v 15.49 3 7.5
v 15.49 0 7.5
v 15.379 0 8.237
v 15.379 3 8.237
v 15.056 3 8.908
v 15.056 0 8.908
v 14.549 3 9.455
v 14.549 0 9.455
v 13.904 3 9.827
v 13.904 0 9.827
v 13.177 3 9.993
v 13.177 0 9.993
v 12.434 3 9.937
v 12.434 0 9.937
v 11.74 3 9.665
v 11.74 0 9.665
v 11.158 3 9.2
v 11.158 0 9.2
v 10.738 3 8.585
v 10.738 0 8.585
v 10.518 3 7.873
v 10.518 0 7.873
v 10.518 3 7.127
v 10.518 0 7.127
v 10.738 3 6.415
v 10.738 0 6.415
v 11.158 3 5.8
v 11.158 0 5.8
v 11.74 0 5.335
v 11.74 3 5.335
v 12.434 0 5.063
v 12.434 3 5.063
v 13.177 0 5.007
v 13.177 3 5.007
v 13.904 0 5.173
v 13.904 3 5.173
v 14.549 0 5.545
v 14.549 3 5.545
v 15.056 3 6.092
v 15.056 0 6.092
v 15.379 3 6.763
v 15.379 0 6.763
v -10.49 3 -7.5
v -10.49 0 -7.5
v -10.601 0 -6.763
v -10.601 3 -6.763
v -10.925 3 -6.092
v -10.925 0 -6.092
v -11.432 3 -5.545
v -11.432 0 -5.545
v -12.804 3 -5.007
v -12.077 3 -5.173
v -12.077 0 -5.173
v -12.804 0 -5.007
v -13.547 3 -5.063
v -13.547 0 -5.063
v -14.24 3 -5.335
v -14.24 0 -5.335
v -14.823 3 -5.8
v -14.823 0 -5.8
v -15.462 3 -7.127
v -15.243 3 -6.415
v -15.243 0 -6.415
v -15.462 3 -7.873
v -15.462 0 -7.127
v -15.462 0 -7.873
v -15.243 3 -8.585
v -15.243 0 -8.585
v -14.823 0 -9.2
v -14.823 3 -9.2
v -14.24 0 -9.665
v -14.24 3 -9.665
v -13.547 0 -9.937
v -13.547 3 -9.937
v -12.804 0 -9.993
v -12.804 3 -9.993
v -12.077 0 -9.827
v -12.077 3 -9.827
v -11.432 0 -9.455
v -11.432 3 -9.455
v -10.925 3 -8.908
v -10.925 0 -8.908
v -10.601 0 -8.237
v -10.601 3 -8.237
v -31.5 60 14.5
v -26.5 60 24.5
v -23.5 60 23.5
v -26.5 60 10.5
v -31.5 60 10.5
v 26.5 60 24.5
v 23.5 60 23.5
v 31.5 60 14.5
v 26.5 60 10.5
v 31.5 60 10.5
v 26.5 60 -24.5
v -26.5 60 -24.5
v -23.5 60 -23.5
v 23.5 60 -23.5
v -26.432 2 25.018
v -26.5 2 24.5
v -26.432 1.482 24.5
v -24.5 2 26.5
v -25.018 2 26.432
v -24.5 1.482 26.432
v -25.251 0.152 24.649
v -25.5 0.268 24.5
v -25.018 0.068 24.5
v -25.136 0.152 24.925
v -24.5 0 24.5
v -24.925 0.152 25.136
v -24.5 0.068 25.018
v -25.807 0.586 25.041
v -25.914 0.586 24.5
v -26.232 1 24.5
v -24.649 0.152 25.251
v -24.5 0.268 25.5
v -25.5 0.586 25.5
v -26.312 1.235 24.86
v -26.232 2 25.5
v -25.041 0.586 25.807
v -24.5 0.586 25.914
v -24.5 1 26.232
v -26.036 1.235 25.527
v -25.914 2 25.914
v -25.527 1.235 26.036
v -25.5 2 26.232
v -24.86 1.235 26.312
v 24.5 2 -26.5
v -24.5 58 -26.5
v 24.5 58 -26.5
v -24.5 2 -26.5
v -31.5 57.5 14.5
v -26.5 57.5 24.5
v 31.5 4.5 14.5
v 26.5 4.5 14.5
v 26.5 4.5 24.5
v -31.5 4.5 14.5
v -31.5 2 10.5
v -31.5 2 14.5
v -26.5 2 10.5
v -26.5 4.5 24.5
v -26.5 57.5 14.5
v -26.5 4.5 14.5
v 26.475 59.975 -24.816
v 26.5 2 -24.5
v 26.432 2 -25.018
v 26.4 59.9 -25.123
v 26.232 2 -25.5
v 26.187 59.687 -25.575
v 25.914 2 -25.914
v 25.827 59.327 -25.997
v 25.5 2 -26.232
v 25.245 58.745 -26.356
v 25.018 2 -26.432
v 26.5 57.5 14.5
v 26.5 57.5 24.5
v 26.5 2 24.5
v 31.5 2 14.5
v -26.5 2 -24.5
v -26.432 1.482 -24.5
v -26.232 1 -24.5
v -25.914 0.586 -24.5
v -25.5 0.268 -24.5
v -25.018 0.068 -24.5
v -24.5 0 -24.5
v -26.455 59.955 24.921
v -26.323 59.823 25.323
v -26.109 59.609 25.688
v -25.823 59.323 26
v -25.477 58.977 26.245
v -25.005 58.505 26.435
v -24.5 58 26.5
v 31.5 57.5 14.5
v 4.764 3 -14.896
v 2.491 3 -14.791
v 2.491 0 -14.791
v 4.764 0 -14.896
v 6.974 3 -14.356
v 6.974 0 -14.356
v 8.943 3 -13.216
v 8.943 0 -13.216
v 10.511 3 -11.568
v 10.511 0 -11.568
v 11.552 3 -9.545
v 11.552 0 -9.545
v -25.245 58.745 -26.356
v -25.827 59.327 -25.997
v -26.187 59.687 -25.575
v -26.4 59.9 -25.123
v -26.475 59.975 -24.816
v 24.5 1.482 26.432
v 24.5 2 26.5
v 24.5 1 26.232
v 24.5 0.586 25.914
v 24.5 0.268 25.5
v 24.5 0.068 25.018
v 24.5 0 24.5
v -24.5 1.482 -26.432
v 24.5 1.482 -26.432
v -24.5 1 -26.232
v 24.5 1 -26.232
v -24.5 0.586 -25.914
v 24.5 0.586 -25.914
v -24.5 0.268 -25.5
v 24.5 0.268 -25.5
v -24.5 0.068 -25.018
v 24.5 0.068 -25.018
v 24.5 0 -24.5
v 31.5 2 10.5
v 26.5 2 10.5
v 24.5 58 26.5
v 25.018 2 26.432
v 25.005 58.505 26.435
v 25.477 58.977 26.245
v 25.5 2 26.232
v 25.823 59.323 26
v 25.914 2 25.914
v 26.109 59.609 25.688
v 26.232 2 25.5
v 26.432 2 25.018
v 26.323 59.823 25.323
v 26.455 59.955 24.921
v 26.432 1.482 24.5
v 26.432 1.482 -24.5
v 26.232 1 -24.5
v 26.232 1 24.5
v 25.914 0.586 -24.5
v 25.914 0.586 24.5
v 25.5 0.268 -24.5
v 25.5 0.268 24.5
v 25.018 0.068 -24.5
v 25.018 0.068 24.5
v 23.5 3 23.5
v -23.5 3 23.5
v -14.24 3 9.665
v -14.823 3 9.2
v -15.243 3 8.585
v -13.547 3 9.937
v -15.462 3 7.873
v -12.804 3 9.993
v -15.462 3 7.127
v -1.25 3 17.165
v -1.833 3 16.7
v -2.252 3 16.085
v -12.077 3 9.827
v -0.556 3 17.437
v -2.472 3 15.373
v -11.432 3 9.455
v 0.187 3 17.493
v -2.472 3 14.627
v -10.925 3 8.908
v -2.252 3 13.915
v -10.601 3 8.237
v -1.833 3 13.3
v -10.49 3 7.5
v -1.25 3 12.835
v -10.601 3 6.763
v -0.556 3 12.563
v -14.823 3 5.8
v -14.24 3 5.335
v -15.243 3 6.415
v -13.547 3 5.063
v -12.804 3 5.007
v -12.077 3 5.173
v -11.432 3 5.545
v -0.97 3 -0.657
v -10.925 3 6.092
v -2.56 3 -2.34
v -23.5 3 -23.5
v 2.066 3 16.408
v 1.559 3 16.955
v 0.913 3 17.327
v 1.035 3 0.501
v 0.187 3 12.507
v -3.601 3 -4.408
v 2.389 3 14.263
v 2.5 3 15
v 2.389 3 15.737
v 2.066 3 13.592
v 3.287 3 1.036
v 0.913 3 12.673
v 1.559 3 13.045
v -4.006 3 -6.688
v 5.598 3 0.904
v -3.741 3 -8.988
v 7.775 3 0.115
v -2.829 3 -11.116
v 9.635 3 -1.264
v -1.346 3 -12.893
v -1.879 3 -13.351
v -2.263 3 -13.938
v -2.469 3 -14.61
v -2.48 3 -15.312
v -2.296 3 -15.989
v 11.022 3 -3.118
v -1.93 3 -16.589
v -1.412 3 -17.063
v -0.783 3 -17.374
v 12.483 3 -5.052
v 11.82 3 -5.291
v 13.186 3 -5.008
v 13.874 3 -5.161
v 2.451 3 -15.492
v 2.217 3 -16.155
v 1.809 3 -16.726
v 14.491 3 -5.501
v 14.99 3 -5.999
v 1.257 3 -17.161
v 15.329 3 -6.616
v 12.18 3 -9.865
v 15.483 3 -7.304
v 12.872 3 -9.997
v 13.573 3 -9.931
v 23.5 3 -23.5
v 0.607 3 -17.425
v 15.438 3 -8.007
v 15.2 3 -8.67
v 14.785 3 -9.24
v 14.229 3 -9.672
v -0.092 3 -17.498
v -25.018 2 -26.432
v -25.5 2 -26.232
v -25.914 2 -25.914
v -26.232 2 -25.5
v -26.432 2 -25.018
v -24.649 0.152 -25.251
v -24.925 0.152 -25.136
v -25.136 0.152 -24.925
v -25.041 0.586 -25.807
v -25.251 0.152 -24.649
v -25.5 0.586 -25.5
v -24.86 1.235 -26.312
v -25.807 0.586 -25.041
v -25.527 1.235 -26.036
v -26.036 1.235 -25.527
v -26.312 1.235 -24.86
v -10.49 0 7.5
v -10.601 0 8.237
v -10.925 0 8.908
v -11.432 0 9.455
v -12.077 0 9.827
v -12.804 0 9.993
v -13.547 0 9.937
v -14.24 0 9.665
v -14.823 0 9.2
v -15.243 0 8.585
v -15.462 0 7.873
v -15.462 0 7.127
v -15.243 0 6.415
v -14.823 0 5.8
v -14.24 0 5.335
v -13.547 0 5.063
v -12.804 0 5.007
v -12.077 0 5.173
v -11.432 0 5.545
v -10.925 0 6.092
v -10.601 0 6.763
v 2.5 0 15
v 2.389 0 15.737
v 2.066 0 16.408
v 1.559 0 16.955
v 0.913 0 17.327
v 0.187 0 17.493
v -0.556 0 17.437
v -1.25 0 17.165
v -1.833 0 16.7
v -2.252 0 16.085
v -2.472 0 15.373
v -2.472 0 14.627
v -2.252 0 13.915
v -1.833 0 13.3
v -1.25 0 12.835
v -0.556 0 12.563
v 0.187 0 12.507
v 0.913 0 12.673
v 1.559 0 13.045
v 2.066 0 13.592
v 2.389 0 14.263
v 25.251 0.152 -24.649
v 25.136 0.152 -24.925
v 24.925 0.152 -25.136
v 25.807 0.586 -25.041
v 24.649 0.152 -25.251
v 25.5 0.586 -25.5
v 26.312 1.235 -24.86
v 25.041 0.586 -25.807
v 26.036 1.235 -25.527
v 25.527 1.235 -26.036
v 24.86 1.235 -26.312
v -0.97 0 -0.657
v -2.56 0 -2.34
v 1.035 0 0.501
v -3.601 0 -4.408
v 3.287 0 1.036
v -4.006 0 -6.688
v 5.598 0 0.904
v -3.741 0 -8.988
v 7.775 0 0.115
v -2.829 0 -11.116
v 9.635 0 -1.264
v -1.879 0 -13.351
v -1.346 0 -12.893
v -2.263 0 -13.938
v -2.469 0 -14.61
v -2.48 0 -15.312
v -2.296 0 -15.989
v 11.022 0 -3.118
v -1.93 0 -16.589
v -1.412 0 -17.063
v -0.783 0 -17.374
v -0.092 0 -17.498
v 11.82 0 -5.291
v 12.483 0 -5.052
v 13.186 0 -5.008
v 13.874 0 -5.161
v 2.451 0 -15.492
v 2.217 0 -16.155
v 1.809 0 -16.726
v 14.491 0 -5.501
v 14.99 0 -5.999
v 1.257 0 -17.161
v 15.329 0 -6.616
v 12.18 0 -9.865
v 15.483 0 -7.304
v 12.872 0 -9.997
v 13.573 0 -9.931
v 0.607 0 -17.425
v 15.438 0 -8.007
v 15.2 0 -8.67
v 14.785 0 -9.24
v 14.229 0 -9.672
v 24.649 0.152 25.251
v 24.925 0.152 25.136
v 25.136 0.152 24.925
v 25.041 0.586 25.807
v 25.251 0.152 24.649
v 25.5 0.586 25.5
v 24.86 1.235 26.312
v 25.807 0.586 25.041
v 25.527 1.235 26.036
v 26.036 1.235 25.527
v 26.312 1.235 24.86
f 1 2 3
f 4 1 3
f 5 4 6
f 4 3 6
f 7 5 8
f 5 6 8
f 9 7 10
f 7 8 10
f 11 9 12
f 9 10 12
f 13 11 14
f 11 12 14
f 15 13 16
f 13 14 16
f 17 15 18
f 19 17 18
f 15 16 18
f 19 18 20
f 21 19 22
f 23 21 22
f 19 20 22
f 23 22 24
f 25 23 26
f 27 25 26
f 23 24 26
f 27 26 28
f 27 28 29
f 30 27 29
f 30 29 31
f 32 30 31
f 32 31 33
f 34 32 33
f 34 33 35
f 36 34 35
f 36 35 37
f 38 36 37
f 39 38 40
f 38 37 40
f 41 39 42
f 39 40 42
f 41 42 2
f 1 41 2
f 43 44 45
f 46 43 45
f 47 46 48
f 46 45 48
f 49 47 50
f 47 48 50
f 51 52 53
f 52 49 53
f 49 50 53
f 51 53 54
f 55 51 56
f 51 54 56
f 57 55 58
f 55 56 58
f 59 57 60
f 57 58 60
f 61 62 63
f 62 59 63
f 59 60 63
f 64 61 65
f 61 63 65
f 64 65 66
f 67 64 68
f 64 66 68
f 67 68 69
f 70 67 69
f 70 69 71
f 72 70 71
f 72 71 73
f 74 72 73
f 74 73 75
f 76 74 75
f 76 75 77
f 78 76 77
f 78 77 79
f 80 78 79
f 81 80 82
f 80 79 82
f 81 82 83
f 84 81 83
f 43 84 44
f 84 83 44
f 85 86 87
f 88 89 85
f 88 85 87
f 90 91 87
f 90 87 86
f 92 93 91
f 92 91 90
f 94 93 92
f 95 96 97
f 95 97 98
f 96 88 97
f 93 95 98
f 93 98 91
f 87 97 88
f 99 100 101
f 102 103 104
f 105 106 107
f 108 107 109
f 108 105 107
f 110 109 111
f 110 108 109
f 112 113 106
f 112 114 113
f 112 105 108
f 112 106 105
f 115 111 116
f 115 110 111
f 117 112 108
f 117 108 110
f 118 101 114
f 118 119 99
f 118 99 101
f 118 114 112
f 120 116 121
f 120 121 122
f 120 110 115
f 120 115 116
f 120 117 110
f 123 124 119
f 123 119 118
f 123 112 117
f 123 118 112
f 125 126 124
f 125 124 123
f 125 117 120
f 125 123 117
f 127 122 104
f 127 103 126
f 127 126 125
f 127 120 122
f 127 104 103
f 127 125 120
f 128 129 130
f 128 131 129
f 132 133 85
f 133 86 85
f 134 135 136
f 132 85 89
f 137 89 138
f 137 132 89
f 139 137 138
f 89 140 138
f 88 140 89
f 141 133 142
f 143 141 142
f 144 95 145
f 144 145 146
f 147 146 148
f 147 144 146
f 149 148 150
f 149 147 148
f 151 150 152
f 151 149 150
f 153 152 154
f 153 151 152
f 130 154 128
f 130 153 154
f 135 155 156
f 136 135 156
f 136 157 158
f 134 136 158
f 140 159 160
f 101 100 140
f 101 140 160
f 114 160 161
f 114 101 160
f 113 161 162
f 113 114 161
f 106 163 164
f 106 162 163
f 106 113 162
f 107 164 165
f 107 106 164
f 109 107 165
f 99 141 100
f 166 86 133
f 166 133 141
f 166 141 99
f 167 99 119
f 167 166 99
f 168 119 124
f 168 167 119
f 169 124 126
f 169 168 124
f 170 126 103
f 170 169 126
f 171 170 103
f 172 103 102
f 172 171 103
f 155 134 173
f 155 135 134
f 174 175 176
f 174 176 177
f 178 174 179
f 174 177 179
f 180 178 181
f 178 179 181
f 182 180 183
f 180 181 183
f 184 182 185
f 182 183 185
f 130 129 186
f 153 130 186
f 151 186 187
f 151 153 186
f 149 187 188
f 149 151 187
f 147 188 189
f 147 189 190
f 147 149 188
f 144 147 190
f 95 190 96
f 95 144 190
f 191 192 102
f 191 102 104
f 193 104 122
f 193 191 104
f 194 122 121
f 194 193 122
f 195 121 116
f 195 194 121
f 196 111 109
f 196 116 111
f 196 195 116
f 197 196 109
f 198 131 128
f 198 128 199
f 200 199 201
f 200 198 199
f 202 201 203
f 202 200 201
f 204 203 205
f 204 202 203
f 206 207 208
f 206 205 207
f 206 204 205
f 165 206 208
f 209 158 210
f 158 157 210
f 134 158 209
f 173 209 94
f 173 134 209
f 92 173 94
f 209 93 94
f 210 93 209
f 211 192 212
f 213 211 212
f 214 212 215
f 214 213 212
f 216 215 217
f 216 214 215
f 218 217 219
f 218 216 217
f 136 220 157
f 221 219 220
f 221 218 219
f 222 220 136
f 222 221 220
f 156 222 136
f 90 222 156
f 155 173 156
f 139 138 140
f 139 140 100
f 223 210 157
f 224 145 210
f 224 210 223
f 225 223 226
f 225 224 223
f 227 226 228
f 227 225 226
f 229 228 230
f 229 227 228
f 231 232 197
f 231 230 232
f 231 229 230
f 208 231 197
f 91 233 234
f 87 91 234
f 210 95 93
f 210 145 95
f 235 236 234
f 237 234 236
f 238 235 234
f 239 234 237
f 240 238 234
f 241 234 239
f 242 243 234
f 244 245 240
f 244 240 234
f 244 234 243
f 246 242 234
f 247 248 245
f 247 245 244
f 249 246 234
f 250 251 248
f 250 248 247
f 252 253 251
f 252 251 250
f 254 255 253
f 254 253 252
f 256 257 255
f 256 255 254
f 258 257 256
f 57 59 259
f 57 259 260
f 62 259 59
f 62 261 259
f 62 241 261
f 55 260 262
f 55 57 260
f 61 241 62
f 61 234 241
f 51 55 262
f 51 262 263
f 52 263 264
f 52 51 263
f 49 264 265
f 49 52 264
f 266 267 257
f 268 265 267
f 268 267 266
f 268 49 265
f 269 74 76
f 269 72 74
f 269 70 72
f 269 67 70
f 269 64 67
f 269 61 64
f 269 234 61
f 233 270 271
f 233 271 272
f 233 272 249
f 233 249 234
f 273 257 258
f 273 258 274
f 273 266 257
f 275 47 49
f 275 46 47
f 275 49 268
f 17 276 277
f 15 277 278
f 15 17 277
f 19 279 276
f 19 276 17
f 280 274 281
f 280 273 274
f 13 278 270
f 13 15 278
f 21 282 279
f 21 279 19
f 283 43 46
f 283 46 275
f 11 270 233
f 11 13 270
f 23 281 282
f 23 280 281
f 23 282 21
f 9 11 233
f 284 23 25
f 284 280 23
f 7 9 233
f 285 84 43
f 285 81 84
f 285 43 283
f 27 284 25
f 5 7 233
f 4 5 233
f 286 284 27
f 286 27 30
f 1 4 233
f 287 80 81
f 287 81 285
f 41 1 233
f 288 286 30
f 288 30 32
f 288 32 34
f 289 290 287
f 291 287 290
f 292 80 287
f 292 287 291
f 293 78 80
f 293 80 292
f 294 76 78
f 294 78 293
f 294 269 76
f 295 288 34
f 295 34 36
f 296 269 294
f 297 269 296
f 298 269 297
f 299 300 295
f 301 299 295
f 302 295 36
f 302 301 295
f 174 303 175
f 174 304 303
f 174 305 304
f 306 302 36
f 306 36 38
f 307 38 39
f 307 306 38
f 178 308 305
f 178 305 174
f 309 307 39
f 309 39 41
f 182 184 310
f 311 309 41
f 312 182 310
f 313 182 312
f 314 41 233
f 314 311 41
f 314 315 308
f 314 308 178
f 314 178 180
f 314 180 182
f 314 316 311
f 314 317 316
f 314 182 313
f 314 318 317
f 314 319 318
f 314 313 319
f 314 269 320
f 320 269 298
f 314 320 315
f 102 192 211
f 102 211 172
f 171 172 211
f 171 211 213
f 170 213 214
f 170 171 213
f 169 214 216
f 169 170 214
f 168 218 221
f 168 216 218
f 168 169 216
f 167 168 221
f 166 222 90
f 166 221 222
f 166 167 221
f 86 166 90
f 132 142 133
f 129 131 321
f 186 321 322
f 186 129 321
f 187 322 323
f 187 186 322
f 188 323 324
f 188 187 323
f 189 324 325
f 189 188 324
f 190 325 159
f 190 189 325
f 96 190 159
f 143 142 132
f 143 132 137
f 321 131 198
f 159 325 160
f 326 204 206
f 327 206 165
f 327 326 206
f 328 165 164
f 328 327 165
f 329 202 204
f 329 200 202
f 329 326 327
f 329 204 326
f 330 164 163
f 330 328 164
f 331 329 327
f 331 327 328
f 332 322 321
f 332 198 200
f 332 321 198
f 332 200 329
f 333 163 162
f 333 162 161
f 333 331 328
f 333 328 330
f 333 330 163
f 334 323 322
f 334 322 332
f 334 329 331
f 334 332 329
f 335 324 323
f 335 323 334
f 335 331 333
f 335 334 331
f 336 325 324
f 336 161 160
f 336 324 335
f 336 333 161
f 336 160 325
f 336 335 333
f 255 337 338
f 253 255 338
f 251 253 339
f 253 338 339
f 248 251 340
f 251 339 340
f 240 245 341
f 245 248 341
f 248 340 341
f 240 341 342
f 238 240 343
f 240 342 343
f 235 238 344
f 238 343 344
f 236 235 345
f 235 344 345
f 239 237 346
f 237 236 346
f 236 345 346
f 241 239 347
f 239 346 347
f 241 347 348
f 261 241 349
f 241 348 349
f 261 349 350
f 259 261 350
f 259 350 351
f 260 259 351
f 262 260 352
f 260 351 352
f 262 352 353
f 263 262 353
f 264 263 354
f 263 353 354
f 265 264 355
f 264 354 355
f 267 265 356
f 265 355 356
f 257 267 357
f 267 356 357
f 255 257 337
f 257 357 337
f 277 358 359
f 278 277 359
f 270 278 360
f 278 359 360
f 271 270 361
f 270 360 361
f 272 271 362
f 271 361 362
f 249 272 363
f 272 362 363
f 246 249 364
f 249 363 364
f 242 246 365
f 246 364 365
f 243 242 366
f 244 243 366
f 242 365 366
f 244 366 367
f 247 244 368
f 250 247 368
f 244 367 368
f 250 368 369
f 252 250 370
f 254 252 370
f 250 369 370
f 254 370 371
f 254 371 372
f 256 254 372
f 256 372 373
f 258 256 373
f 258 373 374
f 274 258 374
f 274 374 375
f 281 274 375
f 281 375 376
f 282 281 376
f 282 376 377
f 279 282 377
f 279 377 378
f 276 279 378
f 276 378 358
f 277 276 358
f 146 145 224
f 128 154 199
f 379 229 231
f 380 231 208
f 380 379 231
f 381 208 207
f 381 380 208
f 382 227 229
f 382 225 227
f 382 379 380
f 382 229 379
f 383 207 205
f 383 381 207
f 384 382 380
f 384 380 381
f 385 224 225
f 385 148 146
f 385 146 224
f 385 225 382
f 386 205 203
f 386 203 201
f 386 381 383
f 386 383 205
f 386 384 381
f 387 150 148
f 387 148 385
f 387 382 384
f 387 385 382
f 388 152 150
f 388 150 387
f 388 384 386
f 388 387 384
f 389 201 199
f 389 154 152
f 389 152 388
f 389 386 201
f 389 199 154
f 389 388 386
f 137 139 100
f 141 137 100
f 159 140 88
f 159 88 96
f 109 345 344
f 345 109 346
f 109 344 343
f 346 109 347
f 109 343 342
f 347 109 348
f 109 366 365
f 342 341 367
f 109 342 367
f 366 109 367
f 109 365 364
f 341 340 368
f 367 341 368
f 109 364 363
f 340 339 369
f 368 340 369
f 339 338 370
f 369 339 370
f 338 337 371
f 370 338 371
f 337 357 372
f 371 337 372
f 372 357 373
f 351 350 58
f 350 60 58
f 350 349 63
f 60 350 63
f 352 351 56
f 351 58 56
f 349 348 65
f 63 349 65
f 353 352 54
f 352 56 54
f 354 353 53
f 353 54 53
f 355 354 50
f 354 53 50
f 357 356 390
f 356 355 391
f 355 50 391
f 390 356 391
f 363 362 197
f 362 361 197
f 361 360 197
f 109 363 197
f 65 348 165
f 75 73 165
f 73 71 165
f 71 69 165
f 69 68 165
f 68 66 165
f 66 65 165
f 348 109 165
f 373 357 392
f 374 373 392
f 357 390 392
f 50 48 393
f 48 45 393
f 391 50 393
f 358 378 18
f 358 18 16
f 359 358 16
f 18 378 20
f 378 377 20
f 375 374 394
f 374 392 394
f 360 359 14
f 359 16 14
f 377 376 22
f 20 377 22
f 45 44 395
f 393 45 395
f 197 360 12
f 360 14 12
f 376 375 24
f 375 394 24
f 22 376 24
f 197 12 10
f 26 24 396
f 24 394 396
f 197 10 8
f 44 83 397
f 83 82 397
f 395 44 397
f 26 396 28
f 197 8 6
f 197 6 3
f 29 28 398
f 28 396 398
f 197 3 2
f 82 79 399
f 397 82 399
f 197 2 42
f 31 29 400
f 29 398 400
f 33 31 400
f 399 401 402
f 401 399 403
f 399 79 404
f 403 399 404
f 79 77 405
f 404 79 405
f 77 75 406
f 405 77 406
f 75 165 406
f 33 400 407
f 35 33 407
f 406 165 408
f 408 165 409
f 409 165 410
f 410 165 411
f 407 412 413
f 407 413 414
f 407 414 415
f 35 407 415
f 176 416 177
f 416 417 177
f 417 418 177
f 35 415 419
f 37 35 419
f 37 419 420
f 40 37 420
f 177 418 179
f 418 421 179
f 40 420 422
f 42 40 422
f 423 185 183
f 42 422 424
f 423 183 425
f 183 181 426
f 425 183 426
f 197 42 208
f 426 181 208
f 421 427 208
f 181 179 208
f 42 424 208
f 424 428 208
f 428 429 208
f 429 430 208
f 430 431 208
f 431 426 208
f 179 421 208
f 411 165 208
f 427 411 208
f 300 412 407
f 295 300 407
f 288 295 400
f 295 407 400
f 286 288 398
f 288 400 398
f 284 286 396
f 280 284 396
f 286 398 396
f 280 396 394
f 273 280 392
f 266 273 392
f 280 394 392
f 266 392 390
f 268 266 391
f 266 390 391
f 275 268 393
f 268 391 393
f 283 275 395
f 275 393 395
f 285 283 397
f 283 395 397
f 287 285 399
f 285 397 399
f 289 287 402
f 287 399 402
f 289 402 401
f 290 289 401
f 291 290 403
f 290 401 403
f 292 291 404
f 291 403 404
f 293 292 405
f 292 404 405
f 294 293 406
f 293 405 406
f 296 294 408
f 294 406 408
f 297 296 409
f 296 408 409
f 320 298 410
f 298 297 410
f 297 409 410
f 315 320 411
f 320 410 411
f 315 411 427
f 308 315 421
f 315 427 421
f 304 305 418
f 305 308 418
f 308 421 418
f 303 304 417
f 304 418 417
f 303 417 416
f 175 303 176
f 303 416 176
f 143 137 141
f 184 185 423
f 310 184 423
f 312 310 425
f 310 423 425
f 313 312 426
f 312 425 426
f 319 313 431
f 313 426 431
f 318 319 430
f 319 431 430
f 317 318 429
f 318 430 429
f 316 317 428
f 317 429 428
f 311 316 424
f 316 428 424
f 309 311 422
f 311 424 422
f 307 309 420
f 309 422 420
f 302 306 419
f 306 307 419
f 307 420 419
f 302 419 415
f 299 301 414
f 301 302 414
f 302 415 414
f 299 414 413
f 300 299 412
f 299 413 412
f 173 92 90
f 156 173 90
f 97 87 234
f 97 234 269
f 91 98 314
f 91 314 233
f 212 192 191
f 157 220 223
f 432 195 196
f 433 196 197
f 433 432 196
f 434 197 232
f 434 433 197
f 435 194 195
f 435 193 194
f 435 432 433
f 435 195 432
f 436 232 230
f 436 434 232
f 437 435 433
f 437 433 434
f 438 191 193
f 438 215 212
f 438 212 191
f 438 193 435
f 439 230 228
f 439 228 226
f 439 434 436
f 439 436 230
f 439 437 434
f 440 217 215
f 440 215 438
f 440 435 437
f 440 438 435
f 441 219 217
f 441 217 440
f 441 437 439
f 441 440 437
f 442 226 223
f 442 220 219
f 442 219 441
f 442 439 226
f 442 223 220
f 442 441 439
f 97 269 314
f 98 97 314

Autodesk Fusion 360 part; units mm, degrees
sketch "Base" plane through (0, 0, 0) normal (0, 0, 1) x (1, 0, 0) in component "UltrasonicSensorSuport"
  line L0 (18, 10.5) -> (-18, 10.5)
  line L1 (-18, 10.5) -> (-18, -10.5)
  line L2 (-18, -10.5) -> (18, -10.5)
  line L3 (18, -10.5) -> (18, 10.5)
  line L4 (18, 10.5) -> (-18, -10.5) construction
  line L5 (-18, 10.5) -> (18, -10.5) construction
  line L6 (-20, 12.5) -> (-20, -12.5)
  line L7 (-20, -12.5) -> (20, -12.5)
  line L8 (20, -12.5) -> (20, 12.5)
  line L9 (20, 12.5) -> (-20, 12.5)
  line L10 (-24, -16.5) -> (24, -16.5)
  line L11 (24, -16.5) -> (24, 16.5)
  line L12 (24, 16.5) -> (-24, 16.5)
  line L13 (-24, 16.5) -> (-24, -16.5)
  circle A0 centre (-16.4, 8.9) radius 1.55
  line L14 (0, 0) -> (-18, 0) construction
  line L15 (0, 0) -> (0, 10.5) construction
  circle A1 centre (-16.4, -8.9) radius 1.55
  circle A2 centre (16.4, 8.9) radius 1.55
  circle A3 centre (16.4, -8.9) radius 1.55
  line L16 (0, 10.5) -> (0, 12.5) construction
  line L17 (0, 12.5) -> (-5.5, 12.5) construction
  line L18 (-5.5, 7.5) -> (5.5, 7.5)
  line L19 (5.5, 7.5) -> (5.5, 19.5)
  line L20 (-5.5, 7.5) -> (-5.5, 19.5)
  line L21 (-5.5, 19.5) -> (5.5, 19.5)
  line L22 (0, 7.5) -> (0, 0) construction
  line L23 (5.5, 7.5) -> (8.5, 7.5) construction
  line L24 (8.5, 7.5) -> (8.5, 10.5) construction
  point P0 (0, 10.5)
  dimension "d8" = 36
  dimension "d9" = 21
  dimension "d12" = 2
  dimension "d13" = 6
  dimension "d46" = 3.1
  dimension "d47" = 1.6
  dimension "d48" = 1.6
  dimension "d52" = 11
  dimension "d53" = 12
  dimension "d54" = 3
  dimension "d55" = 3
extrude "Extrude1" add sketch "Base" along normal blind 3 contours L0 L1 L2 L3 L18 L19 L20 | L0 L1 L2 L3 L6 L7 L8 L9 L19 L20 | L0 L18 L19 L20 | L0 L9 L19 L20 | L6 L7 L8 L9 L10 L11 L12 L13 L19 L20 | L9 L12 L19 L20 | A0 | A1 | A2 | A3 makes body 1 in component "UltrasonicSensorSuport"
sketch "BaseExtension" plane through (0, 0, 3) normal (0, 0, 1) x (-1, 0, 0) in component "UltrasonicSensorSuport"
  line L0 (24, -16.5) -> (24, 16.5)
  line L1 (24, 16.5) -> (-24, 16.5)
  line L2 (-24, 16.5) -> (-24, -16.5)
  line L3 (-24, -16.5) -> (24, -16.5)
  line L4 (20, 12.5) -> (-20, 12.5)
  line L5 (-20, 12.5) -> (-20, -12.5)
  line L6 (-20, -12.5) -> (20, -12.5)
  line L7 (20, -12.5) -> (20, 12.5)
  circle A0 centre (-20.35, 12.85) radius 1.55
  circle A1 centre (20.35, -12.85) radius 1.55
  point P0 (-24, -16.5)
  point P1 (24, -16.5)
  point P2 (24, 16.5)
  point P3 (-24, 16.5)
  dimension "d16" = -4
  dimension "d19" = 3.1
  dimension "d20" = 3.1
  dimension "d21" = 3.65
  dimension "d22" = 3.65
  dimension "d23" = 3.65
  dimension "d24" = 3.65
extrude "Extrude2" add sketch "BaseExtension" along normal blind 6.5 separate body contours L4 L5 L6 L7 A0 A1 | L4 L5 A0 | L6 L7 A1 picked at (-19.557, 11.9554) picked at (20.9471, -13.4767) makes body 2 at (7.0018, 4.0327, 3) in component "UltrasonicSensorSuport"
shell "Shell1" thickness 2 removed faces 1 at (-8, 5.5, 0) on bodies 1 in component "UltrasonicSensorSuport"
sketch "TransducerHoles" plane through (0, 0, 9.5) normal (0, 0, 1) x (-1, 0, 0) in component "UltrasonicSensorSuport"
  line L0 (20, -12.5) -> (20, 12.5)
  line L1 (20, 12.5) -> (-20, 12.5)
  line L2 (-20, 12.5) -> (-20, -12.5)
  line L3 (-20, -12.5) -> (20, -12.5)
  circle A0 centre (-9.5, 0) radius 9
  circle A1 centre (9.5, 0) radius 9
  line L4 (20, -12.5) -> (20, 12.5)
  line L5 (-20, 12.5) -> (-20, -12.5)
  line L6 (20, 0) -> (-20, 0) construction
  line L7 (24, -16.5) -> (24, 16.5)
  line L8 (-24, -16.5) -> (24, -16.5)
  line L9 (24, 16.5) -> (-24, 16.5)
  line L10 (-24, 16.5) -> (-24, -16.5)
  line L11 (-20, -12.5) -> (20, -12.5)
  line L12 (20, 12.5) -> (-20, 12.5)
  line L13 (0, -12.5) -> (0, 12.5) construction
  line L14 (9.5, 0) -> (0, 0) construction
  line L15 (0, 0) -> (-9.5, 0) construction
  line L16 (9.5, -9) -> (-9.5, -9)
  line L17 (9.5, 9) -> (-9.5, 9)
  dimension "d33" = 18
  dimension "d34" = 18
  dimension "d35" = 19
extrude "Extrude7" cut sketch "TransducerHoles" against normal up to surface (9.5 mm away) contours A0 | A0 A1 L16 L17 | A1 bodies 1 2 in component "UltrasonicSensorSuport"
extrude "Extrude8" add 1 faces at (-3.1667, 14, 3) along direction (0, 0, 1) blind 2 on bodies 1 bodies 1 2 in component "UltrasonicSensorSuport"
extrude "Extrude9" cut sketch "Base" along normal up to surface (9.5 mm away) contours A0 | A3 bodies 1 in component "UltrasonicSensorSuport"
extrude "Extrude11" add 1 faces at (7.3333, -15.8333, 0) along direction (0, 0, -1) blind 21 on bodies 1 bodies 1 in component "UltrasonicSensorSuport"
extrude "Extrude10" cut sketch "Base" along normal blind 2 contours L0 L18 L19 L20 | L0 L9 L19 L20 | L9 L12 L19 L20 | L12 L19 L20 L21 bodies 1 in component "UltrasonicSensorSuport"
extrude "Extrude14" cut 1 faces at (-1.8333, 15.1667, 0) along direction (0, 0, -1) up to surface (21 mm away) on bodies 1 bodies 1 in component "UltrasonicSensorSuport"
extrude "Extrude16" cut 1 faces at (-5.5, 15.8333, -6) along direction (-1, 0, 0) blind 2 on bodies 1 bodies 1 in component "UltrasonicSensorSuport"
extrude "Extrude17" cut 1 faces at (5.5, 15.8333, -6) along direction (1, 0, 0) blind 2 on bodies 1 bodies 1 in component "UltrasonicSensorSuport"
sketch "MountingScrewHole" plane through (24, 0, 0) normal (1, 0, 0) x (0, 1, 0) in component "UltrasonicSensorSuport"
  line L0 (16.5, -21) -> (16.5, 5)
  line L1 (16.5, 5) -> (-16.5, 5)
  line L2 (-16.5, 5) -> (-16.5, -21)
  line L3 (16.5, 5) -> (-16.5, -21) construction
  line L4 (16.5, -21) -> (-16.5, 5) construction
  circle A0 centre (0, -8) radius 1.55
  line L5 (-16.5, -21) -> (16.5, -21)
  point P0 (0, -8)
  dimension "d63" = 3.1
extrude "Extrude13" cut sketch "MountingScrewHole" against normal up to surface (2 mm away) contours A0 bodies 1 in component "UltrasonicSensorSuport"
ref_plane "WorkPlane1" through (0, 0, -8) normal (1, 0, 0) x (0, 1, 0) in component "UltrasonicSensorSuport"
mirror "Mirror1" about plane through (0, 0, -8) normal (1, 0, 0) of "Extrude13" in component "UltrasonicSensorSuport"
pattern_linear "00000000-0000-0000-0000-000000000000" [suppressed]
component "UltrasonicSensorSuport" placed x (1, 0, 0) y (0, 1, 0) z (0, 0, 1) at (0, 0, 0)
equation "M3 = 3 mm"
equation "Length = 3.6 cm"
equation "Width = 2.1 cm"
equation "Height = 1 mm"
equation "TransducerHeight = 1.3 cm"
equation "TransducerDiameter = 1.6 cm"
equation "TransducersCenterDistance = 3.5 cm - TransducerDiameter"
equation "d8 = Length"
equation "d9 = Width"
equation "PrintMargin = 2 mm"
equation "BaseThickness = 3 mm"
equation "d12 = PrintMargin"
equation "d13 = PrintMargin + BaseThickness + 1 mm"
equation "d14 = BaseThickness"
equation "d16 = -PrintMargin - 2 mm"
equation "d17 = TransducerHeight / 2"
equation "d19 = M3 + 0.1 mm"
equation "d20 = d19"
equation "d21 = M3 / 2 + 0.15 mm + 2 mm"
equation "d22 = M3 / 2 + 0.15 mm + 2 mm"
equation "d23 = d22"
equation "d24 = d21"
equation "d33 = TransducerDiameter + PrintMargin"
equation "d34 = d33"
equation "d35 = TransducersCenterDistance"
equation "d37 = PrintMargin"
equation "d40 = PrintMargin"
equation "d46 = M3 + 0.1 mm"
equation "d47 = 0.1 mm + M3 / 2"
equation "d48 = d47"
equation "d63 = M3 + 0.1 mm"

Autodesk Fusion 360 part; units mm, degrees
sketch "Front" plane through (0, 0, 0) normal (0, 1, 0) x (1, 0, 0)
  line L0 (23.5, -23.5) -> (-23.5, -23.5)
  line L1 (-23.5, -23.5) -> (-23.5, 23.5)
  line L2 (-23.5, 23.5) -> (23.5, 23.5)
  line L3 (23.5, 23.5) -> (23.5, -23.5)
  line L4 (23.5, -23.5) -> (-23.5, 23.5) construction
  line L5 (-23.5, -23.5) -> (23.5, 23.5) construction
  line L6 (-26.5, 26.5) -> (26.5, 26.5)
  line L7 (26.5, 26.5) -> (26.5, -26.5)
  line L8 (26.5, -26.5) -> (-26.5, -26.5)
  line L9 (-26.5, -26.5) -> (-26.5, 26.5)
  circle A0 centre (3.9904, -6.933) radius 8
  circle A1 centre (0, -15) radius 2.5
  circle A2 centre (12.9904, -7.5) radius 2.5
  circle A3 centre (12.9904, 7.5) radius 2.5
  circle A4 centre (0, 15) radius 2.5
  circle A5 centre (-12.9904, 7.5) radius 2.5
  circle A6 centre (-12.9904, -7.5) radius 2.5
  line L10 (0, 0) -> (0, -23.5) construction
  line L11 (-23.5, 0) -> (23.5, 0)
  circle A7 centre (3.9904, 6.933) radius 8
  dimension "d13" = 47
  dimension "d14" = 47
  dimension "d23" = 16
  dimension "d26" = 5
  dimension "d27" = 15
  dimension "d29" = 360
  dimension "d53" = 9
  dimension "d54" = 9
extrude "Extrude4" add sketch "Front" along normal blind 3 contours L0 L1 L3 A0 A1 A2 L11 | L1 L2 L3 A3 A4 L11 A7 | A0 L11 | L11 A7 | A0 A1 A2 A7 | A0 A3 A4 A7 | A0 A2 | A0 A2 | A3 A7 | A3 A7 | A0 A1 | A0 A1 | A4 A7 | A4 A7 | A5 | A6 makes body 1
extrude "Extrude5" add sketch "Front" along normal blind 60 contours L6 L7 L8 L9 bodies 1
extrude "Extrude6" cut sketch "Front" along normal up to surface (3 mm away) contours A0 L11 | L11 A7 | A0 A3 A4 A7 | A3 A7 | A4 A7 picked at (13.1407, 7.417) picked at (0.1211, 13.399) bodies 1
extrude "Extrude7" cut sketch "Front" along normal up to surface (3 mm away) contours A0 A2 | A0 A2 | A3 A7 | A3 A7 | A0 A1 | A0 A1 | A4 A7 | A4 A7 | A5 | A6 bodies 1
sketch "BottomHole" plane through (0, 0, -26.5) normal (0, 0, -1) x (1, 0, 0)
  line L0 (26.5, 0) -> (-26.5, 0)
  line L1 (-26.5, 0) -> (-26.5, -60)
  line L2 (-26.5, -60) -> (26.5, -60)
  line L3 (26.5, -60) -> (26.5, 0)
  line L4 (-23.5, -3) -> (23.5, -3)
  line L5 (23.5, -3) -> (23.5, -60)
  line L6 (23.5, -60) -> (-23.5, -60)
  line L7 (-23.5, -60) -> (-23.5, -3)
  line L8 (23.5, -3) -> (23.5, -33)
  line L9 (23.5, -33) -> (0, -25.5905)
  line L10 (0, -25.5905) -> (-23.5, -33)
  line L11 (-23.5, -33) -> (23.5, -33)
  line L12 (16.4289, -3) -> (23.5, -10.0711)
  line L13 (0, -3) -> (0, -25.5905)
  line L14 (-16.4289, -3) -> (-23.5, -10.0711)
  dimension "d55" = 30
  dimension "d57" = 145
  dimension "d60" = 45
  dimension "d61" = 5
fillet "Fillet1" radius 2 6 edges at (26.5, 30, 26.5) (-26.5, 30, 26.5) (-26.5, 30, -26.5) (26.5, 30, -26.5) (0, 60, -26.5) (0, 60, 26.5) on bodies 1
fillet "Fillet2" radius 2 8 edges at (-25.9142, 0, 25.9142) (-26.5, 0, 0) (-25.9142, 0, -25.9142) (0, 0, -26.5) (25.9142, 0, -25.9142) (26.5, 0, 0) (25.9142, 0, 25.9142) (0, 0, 26.5) on bodies 1
sketch "Mounting" plane through (-26.5, 0, 0) normal (-1, 0, 0) x (0, -1, 0)
  line L0 (-2, -24.5) -> (-2, 24.5)
  line L1 (-2, 24.5) -> (-60, 24.5)
  line L2 (-60, 24.5) -> (-60, -24.5)
  line L3 (-60, -24.5) -> (-2, -24.5)
  line L4 (-60, 14.5) -> (-2, 14.5)
  line L5 (-2, 14.5) -> (-2, 10.5)
  line L6 (-2, 10.5) -> (-60, 10.5)
  line L7 (-60, 14.5) -> (-60, 10.5)
  dimension "d36" = 4
  dimension "d37" = 10
extrude "Extrude8" add sketch "Mounting" along normal blind 5 separate body contours L0 L2 L4 L5 L6 L7 makes body 2
sketch "ScrewHoles" plane through (0, 0, 14.5) normal (0, 0, 1) x (-1, 0, 0)
  line L0 (26.5, -60) -> (31.5, -60)
  line L1 (31.5, -60) -> (31.5, -2)
  line L2 (31.5, -2) -> (26.5, -2)
  line L3 (26.5, -2) -> (24.5, -2)
  line L4 (24.5, -2) -> (24.5, -58)
  line L5 (26.5, -60) -> (24.5, -58)
  line L6 (26.5, -60) -> (26.5, -2)
  circle A0 centre (29, -51) radius 1.6
  circle A1 centre (29, -31) radius 1.6
  circle A2 centre (29, -11) radius 1.6
  line L7 (26.5, -60) -> (31.5, -2) construction
  line L8 (31.5, -60) -> (26.5, -2) construction
  line L9 (26.5, -2) -> (26.5, -60)
  dimension "d40" = 3.2
  dimension "d43" = 0
  dimension "d44" = 20
extrude "Extrude9" cut sketch "ScrewHoles" against normal up to surface (4 mm away) contours A0 | A1 | A2 bodies 1
sketch "Sketch5" plane through (0, 60, 0) normal (0, 1, 0) x (-1, 0, 0)
  line L0 (23.5, -23.5) -> (-23.5, -23.5)
  line L1 (-23.5, -23.5) -> (-23.5, 23.5)
  line L2 (-23.5, 23.5) -> (23.5, 23.5)
  line L3 (23.5, 23.5) -> (23.5, -23.5)
  line L4 (-26.5, -24.5) -> (26.5, -24.5)
  line L5 (26.5, -24.5) -> (26.5, 24.5)
  line L6 (26.5, 24.5) -> (-26.5, 24.5)
  line L7 (-26.5, 24.5) -> (-26.5, -24.5)
  line L8 (26.5, 14.5) -> (31.5, 14.5)
  line L9 (26.5, -24.5) -> (26.5, 24.5)
  line L10 (26.5, 24.5) -> (31.5, 14.5)
extrude "Extrude10" add sketch "Sketch5" against normal blind 2.5 separate body contours L5 L8 L9 L10 makes body 3
ref_plane "WorkPlane1" through (-29, 31, 12.5) normal (0, 1, 0) x (0, 0, -1)
mirror "Mirror1" about plane through (-29, 31, 12.5) normal (0, 1, 0) of bodies 3 makes body 4
combine "Combine1" operation add target body 2 tool bodies 3 4
mirror "Mirror2" about plane through (0, 0, 0) normal (1, 0, 0) of bodies 2 makes body 5
combine "Combine2" operation add target body 1 tool bodies 5 2
equation "Diameter = 37 mm"
equation "Length = 50 mm"
equation "ShaftDiameter = 6 mm"
equation "ShaftLength = 15 mm"
equation "PrintThickness = 3 mm"
equation "d13 = Diameter + 10 mm"
equation "d14 = d13"
equation "d19 = PrintThickness"
equation "d21 = Length + 10 mm"
equation "d23 = ShaftDiameter + 10 mm"
